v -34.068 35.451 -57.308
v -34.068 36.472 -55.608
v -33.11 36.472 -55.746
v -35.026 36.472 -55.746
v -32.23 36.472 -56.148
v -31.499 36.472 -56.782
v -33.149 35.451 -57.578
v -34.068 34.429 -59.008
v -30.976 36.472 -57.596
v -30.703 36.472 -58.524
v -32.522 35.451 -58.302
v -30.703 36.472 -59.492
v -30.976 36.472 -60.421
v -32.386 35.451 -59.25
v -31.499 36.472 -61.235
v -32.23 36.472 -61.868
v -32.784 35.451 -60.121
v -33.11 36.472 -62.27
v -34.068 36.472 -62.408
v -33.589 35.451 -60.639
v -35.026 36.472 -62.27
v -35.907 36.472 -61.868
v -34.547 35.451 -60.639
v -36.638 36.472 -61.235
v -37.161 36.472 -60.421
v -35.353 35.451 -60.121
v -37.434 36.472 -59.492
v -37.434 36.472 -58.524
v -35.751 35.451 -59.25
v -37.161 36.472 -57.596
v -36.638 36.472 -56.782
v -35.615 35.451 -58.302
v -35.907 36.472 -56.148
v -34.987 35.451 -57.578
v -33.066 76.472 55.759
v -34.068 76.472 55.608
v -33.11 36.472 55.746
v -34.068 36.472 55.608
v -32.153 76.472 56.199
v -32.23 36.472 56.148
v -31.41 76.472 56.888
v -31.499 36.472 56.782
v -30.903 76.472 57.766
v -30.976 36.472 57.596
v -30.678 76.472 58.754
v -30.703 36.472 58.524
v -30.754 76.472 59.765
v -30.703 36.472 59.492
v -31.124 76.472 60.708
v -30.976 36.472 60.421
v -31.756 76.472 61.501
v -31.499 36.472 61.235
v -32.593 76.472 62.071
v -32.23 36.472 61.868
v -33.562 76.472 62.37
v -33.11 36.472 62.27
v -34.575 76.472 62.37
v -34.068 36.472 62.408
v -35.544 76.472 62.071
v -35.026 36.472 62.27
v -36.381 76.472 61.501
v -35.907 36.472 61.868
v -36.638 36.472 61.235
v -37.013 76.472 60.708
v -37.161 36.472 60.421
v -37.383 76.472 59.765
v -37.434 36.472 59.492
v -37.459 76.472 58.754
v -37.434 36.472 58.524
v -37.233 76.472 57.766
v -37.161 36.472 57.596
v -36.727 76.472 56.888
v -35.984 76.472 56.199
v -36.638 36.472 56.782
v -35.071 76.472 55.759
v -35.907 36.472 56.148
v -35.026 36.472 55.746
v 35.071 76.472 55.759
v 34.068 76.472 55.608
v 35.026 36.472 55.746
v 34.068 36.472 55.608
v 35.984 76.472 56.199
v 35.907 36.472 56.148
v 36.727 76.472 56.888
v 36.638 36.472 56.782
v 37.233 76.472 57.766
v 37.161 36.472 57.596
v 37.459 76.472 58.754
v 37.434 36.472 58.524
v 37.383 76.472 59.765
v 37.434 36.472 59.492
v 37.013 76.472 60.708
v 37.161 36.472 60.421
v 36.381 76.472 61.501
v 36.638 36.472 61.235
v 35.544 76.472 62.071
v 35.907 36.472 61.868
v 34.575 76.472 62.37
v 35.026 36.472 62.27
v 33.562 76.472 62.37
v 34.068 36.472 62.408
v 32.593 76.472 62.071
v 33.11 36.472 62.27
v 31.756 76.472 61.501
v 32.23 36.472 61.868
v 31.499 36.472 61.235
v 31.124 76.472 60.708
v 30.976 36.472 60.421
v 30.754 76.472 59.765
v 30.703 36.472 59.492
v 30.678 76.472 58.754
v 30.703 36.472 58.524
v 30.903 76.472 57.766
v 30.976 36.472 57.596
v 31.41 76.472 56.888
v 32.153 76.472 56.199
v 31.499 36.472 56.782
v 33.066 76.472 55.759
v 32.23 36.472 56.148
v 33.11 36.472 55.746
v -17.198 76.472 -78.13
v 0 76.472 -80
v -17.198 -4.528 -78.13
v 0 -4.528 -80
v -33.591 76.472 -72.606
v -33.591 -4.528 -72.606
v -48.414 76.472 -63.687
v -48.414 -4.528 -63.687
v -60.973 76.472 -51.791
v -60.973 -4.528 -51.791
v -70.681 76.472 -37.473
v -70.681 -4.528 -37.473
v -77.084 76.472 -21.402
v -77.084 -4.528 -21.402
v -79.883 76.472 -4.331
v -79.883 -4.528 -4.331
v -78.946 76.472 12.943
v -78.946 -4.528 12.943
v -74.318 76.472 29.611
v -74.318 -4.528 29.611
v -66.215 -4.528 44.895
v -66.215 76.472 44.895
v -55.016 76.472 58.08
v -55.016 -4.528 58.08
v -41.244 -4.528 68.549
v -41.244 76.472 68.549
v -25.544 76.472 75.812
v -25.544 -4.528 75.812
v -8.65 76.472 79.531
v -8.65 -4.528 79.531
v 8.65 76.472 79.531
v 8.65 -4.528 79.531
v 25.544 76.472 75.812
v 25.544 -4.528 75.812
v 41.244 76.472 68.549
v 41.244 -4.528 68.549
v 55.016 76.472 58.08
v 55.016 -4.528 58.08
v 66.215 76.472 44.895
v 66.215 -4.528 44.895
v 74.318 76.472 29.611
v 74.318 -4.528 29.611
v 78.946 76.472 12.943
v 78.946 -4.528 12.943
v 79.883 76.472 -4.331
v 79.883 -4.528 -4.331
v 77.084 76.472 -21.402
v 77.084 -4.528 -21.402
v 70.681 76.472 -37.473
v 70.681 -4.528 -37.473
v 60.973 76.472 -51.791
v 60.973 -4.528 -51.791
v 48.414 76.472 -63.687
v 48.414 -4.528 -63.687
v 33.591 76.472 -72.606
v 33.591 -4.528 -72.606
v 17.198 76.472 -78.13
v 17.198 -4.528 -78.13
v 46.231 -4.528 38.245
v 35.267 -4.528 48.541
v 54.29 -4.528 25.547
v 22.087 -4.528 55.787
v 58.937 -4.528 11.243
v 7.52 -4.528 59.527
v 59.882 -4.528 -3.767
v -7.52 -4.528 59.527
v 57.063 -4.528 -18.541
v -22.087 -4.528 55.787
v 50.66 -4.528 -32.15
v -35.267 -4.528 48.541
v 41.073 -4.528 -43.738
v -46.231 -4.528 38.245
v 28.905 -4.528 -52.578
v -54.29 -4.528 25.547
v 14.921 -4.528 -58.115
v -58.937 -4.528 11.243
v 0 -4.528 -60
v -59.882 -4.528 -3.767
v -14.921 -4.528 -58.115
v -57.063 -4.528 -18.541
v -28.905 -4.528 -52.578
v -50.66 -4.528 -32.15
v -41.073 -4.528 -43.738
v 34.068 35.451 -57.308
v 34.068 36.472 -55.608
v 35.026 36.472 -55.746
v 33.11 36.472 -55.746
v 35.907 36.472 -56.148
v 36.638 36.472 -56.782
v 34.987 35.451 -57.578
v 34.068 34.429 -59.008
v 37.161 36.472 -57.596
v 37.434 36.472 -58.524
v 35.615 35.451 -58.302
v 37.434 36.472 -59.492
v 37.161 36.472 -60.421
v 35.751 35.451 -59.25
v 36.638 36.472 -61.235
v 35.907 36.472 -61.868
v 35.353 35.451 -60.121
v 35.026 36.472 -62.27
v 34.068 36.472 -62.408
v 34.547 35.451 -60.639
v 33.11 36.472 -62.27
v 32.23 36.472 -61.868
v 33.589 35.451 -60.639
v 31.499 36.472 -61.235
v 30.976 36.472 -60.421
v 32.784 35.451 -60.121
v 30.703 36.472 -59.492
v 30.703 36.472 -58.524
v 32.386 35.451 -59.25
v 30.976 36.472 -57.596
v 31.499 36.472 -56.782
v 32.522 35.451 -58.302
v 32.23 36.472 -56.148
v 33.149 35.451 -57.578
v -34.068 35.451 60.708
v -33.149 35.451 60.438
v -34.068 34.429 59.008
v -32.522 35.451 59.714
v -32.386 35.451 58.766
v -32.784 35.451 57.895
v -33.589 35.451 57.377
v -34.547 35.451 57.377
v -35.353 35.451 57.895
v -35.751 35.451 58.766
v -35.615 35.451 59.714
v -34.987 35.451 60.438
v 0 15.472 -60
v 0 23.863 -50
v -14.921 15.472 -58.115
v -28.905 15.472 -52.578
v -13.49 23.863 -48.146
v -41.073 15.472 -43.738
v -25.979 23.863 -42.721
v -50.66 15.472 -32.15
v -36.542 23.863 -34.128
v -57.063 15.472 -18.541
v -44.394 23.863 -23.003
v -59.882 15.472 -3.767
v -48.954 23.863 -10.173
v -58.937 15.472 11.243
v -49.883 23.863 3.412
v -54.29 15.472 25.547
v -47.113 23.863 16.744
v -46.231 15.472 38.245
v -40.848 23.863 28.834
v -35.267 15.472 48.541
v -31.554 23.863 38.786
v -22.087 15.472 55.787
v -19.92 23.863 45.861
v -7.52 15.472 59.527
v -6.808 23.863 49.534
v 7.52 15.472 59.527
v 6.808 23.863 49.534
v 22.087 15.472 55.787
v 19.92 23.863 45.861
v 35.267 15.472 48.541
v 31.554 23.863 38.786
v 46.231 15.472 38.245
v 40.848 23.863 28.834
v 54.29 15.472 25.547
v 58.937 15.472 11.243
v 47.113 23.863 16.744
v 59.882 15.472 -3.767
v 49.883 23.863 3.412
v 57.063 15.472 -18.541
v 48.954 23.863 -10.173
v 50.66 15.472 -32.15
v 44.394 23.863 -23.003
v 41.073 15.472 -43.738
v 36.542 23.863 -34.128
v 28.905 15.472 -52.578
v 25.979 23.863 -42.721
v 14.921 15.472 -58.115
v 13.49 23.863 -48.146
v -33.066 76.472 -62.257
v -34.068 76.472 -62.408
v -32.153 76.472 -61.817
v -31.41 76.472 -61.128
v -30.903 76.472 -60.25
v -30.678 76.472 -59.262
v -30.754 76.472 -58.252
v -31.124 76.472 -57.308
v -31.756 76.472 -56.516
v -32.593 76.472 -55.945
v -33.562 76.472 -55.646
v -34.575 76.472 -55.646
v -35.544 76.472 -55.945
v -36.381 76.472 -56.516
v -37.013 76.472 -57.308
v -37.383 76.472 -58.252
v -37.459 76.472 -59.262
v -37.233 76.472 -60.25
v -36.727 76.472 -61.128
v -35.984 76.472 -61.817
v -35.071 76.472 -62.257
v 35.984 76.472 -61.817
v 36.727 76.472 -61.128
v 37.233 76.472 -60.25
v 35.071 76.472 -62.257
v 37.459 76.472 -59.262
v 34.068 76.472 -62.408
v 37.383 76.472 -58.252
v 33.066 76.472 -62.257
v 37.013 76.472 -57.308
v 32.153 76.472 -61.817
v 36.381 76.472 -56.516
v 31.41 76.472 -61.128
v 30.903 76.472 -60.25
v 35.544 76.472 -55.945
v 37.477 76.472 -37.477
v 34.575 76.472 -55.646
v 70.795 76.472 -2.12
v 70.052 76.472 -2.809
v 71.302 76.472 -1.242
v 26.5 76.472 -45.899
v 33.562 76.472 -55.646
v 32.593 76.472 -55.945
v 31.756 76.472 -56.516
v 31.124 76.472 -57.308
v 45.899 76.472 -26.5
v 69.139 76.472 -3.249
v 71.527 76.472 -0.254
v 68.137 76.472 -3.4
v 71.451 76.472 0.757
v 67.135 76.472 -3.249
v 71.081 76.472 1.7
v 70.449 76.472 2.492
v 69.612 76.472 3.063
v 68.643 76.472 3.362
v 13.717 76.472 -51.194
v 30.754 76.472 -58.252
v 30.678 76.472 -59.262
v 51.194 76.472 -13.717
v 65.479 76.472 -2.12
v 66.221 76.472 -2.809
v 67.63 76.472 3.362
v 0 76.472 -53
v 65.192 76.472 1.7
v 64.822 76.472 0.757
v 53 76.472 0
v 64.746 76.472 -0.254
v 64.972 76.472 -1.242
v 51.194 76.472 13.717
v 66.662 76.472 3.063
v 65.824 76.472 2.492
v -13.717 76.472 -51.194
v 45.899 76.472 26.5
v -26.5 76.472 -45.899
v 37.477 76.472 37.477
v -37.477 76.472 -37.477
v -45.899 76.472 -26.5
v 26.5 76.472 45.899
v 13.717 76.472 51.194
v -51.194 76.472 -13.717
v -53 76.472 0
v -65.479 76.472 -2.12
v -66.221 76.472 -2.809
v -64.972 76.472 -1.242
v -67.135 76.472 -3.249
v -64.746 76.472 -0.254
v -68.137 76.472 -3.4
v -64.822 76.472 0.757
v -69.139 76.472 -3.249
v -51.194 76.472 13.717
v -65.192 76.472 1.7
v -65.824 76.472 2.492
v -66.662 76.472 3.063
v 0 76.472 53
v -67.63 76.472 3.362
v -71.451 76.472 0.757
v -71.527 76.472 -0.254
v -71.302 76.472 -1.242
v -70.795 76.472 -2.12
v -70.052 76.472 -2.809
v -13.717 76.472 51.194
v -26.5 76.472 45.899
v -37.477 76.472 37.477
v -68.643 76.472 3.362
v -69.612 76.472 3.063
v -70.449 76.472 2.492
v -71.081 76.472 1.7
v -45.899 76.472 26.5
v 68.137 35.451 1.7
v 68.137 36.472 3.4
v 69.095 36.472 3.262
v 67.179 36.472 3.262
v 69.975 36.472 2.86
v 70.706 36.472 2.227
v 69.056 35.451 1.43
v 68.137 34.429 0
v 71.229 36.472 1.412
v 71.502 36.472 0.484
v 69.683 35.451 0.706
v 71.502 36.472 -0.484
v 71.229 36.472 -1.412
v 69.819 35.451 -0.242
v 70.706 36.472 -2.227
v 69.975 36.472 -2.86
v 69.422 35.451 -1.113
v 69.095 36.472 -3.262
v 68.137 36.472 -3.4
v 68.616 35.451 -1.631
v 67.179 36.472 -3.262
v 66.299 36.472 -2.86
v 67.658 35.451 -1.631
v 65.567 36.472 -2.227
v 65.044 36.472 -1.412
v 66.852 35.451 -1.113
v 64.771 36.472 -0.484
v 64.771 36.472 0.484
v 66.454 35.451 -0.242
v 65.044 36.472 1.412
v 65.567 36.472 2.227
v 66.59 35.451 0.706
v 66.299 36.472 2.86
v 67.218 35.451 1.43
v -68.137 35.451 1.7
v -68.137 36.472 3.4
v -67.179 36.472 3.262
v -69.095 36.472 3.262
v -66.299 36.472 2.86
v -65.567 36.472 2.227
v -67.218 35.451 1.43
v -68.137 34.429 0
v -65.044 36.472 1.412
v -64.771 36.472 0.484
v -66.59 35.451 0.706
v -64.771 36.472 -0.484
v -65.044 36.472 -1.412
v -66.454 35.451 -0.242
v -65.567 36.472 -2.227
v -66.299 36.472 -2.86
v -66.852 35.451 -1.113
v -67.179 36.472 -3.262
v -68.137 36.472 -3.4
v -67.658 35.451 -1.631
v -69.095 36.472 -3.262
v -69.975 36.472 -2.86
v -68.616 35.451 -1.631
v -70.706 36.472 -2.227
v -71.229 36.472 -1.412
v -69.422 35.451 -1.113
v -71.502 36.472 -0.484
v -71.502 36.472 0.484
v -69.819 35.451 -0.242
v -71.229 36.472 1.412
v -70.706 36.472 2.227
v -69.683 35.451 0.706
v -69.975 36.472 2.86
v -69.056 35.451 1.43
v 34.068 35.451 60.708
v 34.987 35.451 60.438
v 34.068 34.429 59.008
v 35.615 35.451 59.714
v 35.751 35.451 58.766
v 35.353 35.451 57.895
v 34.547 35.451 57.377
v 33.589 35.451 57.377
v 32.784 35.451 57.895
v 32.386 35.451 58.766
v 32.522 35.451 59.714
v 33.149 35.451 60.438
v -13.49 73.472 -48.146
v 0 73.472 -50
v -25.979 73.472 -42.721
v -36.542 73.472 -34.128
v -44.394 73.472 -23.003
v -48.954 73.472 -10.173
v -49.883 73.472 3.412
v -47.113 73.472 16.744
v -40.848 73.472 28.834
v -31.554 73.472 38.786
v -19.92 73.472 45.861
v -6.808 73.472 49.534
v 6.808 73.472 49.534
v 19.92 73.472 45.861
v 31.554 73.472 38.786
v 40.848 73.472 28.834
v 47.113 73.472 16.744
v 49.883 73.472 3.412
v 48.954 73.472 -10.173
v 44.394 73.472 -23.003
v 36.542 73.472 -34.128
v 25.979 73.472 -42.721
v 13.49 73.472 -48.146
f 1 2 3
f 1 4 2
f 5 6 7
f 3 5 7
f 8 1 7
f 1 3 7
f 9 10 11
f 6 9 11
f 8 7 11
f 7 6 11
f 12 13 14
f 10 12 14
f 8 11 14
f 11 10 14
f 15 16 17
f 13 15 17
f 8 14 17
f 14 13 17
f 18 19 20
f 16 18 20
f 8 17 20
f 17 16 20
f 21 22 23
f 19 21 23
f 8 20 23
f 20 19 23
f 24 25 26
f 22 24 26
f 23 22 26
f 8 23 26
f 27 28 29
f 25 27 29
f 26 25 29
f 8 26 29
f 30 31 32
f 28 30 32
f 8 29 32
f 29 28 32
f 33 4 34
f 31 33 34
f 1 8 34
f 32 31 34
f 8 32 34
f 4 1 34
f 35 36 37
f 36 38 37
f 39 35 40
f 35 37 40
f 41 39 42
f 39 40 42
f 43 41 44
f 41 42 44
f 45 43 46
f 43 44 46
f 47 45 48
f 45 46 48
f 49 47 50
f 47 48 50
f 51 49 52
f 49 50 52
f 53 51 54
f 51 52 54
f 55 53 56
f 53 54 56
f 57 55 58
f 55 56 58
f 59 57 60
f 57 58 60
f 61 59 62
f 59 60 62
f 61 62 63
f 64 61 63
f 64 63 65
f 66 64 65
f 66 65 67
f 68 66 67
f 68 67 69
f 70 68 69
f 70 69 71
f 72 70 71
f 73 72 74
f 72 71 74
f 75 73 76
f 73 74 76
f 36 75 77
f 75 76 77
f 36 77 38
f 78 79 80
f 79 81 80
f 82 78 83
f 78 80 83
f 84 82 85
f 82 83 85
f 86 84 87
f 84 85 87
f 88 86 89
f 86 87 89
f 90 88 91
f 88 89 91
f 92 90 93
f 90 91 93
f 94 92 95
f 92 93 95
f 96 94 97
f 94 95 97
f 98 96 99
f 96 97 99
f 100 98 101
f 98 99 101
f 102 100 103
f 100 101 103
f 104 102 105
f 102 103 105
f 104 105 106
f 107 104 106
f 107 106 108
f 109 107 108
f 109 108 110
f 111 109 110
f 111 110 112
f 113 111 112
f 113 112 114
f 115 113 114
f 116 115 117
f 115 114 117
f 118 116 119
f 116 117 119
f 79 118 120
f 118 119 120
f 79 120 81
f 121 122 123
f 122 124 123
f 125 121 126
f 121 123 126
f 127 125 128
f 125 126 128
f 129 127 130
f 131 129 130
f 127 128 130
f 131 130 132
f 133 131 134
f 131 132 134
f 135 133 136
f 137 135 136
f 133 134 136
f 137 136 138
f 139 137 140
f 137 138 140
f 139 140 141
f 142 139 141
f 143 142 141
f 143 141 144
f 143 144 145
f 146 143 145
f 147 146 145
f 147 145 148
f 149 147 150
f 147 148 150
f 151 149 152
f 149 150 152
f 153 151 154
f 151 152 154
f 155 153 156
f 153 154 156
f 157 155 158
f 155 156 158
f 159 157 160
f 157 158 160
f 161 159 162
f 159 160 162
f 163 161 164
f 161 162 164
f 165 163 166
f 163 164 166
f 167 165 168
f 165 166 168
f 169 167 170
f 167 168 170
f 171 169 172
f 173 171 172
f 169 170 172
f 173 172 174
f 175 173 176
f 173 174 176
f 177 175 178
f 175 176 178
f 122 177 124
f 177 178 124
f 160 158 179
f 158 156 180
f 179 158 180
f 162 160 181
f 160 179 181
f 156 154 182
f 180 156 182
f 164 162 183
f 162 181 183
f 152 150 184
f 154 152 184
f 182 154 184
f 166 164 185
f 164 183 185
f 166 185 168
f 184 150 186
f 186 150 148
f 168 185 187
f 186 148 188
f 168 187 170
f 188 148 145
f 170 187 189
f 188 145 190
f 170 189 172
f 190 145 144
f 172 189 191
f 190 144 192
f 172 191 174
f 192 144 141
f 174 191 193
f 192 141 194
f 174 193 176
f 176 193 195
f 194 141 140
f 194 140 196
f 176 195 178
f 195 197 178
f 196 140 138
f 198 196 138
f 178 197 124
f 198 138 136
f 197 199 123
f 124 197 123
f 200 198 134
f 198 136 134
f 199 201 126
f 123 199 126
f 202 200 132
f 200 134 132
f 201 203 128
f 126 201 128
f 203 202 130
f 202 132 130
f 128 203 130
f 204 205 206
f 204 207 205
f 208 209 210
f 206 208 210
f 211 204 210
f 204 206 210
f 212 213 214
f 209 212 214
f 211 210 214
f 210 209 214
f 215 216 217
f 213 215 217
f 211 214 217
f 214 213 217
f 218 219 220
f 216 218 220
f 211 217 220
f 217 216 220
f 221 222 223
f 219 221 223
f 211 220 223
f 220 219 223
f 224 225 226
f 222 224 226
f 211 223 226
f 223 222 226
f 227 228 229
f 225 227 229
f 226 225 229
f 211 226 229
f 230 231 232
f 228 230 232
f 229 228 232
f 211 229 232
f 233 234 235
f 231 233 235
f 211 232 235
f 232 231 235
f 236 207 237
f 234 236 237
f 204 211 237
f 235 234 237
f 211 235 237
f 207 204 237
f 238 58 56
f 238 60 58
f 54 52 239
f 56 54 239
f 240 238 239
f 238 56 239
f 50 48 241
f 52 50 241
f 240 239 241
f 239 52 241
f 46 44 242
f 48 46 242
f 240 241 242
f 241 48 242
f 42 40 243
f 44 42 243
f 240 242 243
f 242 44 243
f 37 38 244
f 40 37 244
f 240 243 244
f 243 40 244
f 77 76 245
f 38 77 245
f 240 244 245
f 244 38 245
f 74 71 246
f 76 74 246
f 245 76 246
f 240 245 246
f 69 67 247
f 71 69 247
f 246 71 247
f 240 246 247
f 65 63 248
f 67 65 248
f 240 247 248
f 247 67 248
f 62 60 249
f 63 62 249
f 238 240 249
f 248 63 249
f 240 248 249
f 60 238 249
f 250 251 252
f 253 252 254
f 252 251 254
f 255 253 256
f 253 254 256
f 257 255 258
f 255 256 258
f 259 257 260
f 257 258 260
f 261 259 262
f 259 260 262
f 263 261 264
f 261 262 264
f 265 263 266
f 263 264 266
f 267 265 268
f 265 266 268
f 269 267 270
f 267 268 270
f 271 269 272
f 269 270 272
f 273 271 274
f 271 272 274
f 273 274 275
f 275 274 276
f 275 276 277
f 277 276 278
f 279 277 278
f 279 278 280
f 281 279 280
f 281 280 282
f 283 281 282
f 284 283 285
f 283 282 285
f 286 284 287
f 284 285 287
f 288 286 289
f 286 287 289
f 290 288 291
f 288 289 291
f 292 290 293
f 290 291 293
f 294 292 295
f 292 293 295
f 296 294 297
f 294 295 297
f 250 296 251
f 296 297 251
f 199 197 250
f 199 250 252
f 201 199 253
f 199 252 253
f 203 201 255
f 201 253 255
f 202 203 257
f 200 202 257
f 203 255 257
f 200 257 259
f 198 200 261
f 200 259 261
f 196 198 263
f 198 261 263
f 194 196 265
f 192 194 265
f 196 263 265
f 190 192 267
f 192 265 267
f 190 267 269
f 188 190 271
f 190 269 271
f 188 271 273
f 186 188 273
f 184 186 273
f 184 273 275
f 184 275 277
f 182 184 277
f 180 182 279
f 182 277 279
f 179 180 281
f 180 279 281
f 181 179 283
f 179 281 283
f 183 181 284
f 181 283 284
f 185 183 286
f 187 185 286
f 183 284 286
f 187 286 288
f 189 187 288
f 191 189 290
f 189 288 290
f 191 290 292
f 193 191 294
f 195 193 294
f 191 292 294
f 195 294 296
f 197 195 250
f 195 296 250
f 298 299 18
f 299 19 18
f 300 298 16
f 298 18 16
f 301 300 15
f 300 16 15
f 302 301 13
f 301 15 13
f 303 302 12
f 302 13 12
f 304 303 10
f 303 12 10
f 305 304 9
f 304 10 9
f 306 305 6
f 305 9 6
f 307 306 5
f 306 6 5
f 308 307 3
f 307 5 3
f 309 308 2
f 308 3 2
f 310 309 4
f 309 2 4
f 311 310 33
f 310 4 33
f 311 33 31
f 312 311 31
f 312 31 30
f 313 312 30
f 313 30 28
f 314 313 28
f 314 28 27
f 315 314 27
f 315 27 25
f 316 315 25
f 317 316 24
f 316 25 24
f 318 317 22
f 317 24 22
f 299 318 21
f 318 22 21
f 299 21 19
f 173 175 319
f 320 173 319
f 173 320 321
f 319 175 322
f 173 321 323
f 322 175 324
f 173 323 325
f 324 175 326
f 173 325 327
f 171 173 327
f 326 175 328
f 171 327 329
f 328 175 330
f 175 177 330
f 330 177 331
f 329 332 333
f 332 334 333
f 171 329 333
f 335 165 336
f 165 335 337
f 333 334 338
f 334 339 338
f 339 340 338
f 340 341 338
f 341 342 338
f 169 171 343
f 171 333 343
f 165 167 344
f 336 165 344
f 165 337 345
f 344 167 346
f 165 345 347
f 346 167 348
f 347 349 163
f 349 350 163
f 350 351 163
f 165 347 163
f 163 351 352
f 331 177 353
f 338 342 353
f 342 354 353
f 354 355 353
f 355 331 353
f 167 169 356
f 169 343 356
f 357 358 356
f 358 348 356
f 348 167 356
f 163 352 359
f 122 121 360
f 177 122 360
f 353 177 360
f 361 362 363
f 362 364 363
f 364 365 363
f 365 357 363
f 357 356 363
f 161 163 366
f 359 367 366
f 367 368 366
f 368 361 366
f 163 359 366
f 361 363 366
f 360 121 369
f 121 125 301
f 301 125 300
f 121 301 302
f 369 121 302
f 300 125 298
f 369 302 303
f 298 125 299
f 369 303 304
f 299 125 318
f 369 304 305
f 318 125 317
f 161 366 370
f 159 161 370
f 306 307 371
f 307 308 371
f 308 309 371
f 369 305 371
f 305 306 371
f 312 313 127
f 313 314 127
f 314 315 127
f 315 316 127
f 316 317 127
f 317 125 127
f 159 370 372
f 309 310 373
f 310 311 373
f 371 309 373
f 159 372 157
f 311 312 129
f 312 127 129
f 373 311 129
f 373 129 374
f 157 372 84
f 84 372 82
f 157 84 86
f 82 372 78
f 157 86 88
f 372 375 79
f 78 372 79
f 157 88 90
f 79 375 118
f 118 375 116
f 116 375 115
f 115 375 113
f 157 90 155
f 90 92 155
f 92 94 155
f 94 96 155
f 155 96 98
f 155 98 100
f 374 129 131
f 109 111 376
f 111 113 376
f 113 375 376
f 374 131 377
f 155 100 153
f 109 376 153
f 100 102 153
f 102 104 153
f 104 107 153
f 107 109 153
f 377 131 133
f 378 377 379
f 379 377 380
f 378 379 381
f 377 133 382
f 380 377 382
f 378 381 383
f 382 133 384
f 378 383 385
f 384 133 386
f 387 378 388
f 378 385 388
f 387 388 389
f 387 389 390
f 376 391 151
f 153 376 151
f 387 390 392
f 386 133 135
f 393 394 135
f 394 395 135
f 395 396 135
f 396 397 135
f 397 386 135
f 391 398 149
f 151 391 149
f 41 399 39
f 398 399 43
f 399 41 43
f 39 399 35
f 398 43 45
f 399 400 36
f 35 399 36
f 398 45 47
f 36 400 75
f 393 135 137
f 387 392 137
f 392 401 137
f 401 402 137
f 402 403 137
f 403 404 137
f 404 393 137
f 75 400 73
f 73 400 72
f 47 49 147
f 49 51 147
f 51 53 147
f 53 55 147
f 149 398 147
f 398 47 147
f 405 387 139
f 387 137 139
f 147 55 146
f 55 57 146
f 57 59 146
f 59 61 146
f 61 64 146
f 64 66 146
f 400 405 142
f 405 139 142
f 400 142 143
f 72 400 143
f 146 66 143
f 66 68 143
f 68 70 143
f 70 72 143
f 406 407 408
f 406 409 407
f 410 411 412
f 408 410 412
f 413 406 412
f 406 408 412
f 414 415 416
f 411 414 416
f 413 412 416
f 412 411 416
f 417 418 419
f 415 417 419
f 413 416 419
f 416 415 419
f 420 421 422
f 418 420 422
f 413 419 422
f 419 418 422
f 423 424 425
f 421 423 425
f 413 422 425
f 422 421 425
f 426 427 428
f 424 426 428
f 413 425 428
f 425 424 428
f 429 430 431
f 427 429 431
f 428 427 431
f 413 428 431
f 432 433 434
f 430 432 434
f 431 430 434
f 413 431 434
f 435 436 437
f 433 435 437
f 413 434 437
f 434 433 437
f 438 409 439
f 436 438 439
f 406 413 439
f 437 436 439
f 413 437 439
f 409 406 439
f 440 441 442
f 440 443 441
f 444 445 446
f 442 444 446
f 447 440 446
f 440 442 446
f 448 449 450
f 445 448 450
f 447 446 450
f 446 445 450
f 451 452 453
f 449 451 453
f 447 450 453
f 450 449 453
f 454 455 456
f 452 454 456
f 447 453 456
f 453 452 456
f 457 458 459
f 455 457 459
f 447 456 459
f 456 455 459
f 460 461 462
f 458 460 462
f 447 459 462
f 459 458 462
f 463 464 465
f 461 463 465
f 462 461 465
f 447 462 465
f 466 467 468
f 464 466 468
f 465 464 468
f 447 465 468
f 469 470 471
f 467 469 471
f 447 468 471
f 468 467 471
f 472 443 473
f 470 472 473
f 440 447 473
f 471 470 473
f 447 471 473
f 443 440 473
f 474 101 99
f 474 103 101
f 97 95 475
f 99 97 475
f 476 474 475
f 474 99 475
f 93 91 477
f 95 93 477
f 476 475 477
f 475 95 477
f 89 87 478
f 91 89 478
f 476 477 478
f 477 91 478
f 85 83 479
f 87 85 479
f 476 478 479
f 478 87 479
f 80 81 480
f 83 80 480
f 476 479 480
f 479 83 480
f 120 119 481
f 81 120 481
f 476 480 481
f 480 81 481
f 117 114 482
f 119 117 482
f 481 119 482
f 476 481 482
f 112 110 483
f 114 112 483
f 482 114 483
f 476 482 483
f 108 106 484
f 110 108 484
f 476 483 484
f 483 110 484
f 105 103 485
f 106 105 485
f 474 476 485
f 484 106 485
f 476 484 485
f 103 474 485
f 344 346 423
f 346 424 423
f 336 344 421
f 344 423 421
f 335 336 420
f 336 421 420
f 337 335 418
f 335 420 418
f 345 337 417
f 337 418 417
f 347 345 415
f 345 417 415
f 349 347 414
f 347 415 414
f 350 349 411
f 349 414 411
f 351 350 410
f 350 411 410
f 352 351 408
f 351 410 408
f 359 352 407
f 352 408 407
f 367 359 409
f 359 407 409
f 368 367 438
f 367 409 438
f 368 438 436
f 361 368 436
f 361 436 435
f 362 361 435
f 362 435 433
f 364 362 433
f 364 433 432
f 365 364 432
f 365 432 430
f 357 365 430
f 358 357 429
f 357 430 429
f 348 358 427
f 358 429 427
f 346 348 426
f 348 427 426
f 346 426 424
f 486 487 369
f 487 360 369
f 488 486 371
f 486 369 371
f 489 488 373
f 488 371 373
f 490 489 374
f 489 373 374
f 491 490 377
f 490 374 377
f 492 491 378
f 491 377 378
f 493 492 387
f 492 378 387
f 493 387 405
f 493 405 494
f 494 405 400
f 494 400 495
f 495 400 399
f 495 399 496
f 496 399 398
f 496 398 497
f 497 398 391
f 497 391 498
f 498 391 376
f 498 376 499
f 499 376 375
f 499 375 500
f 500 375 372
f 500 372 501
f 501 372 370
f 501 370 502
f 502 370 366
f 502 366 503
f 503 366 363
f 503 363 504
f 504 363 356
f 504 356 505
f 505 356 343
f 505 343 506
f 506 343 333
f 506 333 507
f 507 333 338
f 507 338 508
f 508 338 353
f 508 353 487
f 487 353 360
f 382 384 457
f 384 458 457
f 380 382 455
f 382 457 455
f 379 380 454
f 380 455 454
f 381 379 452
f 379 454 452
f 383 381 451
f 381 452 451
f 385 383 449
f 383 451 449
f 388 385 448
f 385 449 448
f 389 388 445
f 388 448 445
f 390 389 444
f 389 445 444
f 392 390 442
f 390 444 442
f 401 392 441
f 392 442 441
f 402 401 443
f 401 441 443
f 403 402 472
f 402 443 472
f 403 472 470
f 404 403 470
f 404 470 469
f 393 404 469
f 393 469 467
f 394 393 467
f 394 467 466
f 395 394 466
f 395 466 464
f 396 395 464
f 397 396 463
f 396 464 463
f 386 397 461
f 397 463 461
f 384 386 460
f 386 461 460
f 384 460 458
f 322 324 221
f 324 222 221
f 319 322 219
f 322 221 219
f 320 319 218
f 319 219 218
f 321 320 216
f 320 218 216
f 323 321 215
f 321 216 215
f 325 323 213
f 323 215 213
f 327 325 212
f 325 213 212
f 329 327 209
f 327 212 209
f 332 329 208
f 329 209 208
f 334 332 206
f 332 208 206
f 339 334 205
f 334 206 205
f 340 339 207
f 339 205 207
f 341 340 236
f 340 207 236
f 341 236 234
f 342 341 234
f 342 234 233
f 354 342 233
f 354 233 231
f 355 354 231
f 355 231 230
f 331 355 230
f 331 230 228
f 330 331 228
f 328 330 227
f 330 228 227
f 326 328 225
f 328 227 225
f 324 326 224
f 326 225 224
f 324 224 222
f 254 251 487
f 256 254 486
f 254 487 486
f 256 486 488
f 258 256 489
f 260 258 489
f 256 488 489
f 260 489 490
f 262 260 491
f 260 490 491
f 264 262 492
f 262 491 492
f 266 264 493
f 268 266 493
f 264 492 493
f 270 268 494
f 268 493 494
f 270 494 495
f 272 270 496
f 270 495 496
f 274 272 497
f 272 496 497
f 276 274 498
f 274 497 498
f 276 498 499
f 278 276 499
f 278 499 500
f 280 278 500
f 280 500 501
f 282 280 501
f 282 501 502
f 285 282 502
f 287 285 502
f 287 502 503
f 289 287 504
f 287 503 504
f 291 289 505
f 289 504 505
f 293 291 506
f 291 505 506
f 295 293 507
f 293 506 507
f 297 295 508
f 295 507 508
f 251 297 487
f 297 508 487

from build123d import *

# Parameters (mm, degrees)
OTW_R_GWINTOWANY_M81_D     = 6.8
OTW_R_GWINTOWANY_M81_DEPTH = 40
OTW_R_GWINTOWANY_M81_TIP   = 2.042926105


with BuildPart() as part:
    # Szkic1 → Obrót1 (revolve)
    with BuildSketch(Plane.XY, mode=Mode.PRIVATE) as obr_t1_sk:
        Polygon((-60, -4.527704194), (-60, 15.472295806), (-60, 76.472295806), (-80, 76.472295806), (-80, -4.527704194), align=None)
        Polygon((-50, 23.863292118), (-50, 73.472295806), (-53, 76.472295806), (-60, 76.472295806), (-60, 15.472295806), align=None)
    revolve(obr_t1_sk.sketch.rotate(Axis((0, 0, 0), (0, 1, 0)), 270), axis=Axis((0, 0, 0), (0, 1, 0)))

    # Otwór gwintowany M81
    with Locations(Plane(origin=(-68.136728334, 76.472295806, 0), x_dir=(0, 0, 1), z_dir=(0, 1, 0))):
        with Locations((0, 0), (-59.008137668, 34.068364167), (-59.008137668, 102.205092501), (0, 136.273456668), (59.008137668, 102.205092501), (59.008137668, 34.068364167)):
            Hole(OTW_R_GWINTOWANY_M81_D / 2, depth=OTW_R_GWINTOWANY_M81_DEPTH)
            with Locations((0, 0, -(OTW_R_GWINTOWANY_M81_DEPTH + OTW_R_GWINTOWANY_M81_TIP / 2))):  # 118° drill point
                Cone(0, OTW_R_GWINTOWANY_M81_D / 2, OTW_R_GWINTOWANY_M81_TIP, mode=Mode.SUBTRACT)


solid = part.part
